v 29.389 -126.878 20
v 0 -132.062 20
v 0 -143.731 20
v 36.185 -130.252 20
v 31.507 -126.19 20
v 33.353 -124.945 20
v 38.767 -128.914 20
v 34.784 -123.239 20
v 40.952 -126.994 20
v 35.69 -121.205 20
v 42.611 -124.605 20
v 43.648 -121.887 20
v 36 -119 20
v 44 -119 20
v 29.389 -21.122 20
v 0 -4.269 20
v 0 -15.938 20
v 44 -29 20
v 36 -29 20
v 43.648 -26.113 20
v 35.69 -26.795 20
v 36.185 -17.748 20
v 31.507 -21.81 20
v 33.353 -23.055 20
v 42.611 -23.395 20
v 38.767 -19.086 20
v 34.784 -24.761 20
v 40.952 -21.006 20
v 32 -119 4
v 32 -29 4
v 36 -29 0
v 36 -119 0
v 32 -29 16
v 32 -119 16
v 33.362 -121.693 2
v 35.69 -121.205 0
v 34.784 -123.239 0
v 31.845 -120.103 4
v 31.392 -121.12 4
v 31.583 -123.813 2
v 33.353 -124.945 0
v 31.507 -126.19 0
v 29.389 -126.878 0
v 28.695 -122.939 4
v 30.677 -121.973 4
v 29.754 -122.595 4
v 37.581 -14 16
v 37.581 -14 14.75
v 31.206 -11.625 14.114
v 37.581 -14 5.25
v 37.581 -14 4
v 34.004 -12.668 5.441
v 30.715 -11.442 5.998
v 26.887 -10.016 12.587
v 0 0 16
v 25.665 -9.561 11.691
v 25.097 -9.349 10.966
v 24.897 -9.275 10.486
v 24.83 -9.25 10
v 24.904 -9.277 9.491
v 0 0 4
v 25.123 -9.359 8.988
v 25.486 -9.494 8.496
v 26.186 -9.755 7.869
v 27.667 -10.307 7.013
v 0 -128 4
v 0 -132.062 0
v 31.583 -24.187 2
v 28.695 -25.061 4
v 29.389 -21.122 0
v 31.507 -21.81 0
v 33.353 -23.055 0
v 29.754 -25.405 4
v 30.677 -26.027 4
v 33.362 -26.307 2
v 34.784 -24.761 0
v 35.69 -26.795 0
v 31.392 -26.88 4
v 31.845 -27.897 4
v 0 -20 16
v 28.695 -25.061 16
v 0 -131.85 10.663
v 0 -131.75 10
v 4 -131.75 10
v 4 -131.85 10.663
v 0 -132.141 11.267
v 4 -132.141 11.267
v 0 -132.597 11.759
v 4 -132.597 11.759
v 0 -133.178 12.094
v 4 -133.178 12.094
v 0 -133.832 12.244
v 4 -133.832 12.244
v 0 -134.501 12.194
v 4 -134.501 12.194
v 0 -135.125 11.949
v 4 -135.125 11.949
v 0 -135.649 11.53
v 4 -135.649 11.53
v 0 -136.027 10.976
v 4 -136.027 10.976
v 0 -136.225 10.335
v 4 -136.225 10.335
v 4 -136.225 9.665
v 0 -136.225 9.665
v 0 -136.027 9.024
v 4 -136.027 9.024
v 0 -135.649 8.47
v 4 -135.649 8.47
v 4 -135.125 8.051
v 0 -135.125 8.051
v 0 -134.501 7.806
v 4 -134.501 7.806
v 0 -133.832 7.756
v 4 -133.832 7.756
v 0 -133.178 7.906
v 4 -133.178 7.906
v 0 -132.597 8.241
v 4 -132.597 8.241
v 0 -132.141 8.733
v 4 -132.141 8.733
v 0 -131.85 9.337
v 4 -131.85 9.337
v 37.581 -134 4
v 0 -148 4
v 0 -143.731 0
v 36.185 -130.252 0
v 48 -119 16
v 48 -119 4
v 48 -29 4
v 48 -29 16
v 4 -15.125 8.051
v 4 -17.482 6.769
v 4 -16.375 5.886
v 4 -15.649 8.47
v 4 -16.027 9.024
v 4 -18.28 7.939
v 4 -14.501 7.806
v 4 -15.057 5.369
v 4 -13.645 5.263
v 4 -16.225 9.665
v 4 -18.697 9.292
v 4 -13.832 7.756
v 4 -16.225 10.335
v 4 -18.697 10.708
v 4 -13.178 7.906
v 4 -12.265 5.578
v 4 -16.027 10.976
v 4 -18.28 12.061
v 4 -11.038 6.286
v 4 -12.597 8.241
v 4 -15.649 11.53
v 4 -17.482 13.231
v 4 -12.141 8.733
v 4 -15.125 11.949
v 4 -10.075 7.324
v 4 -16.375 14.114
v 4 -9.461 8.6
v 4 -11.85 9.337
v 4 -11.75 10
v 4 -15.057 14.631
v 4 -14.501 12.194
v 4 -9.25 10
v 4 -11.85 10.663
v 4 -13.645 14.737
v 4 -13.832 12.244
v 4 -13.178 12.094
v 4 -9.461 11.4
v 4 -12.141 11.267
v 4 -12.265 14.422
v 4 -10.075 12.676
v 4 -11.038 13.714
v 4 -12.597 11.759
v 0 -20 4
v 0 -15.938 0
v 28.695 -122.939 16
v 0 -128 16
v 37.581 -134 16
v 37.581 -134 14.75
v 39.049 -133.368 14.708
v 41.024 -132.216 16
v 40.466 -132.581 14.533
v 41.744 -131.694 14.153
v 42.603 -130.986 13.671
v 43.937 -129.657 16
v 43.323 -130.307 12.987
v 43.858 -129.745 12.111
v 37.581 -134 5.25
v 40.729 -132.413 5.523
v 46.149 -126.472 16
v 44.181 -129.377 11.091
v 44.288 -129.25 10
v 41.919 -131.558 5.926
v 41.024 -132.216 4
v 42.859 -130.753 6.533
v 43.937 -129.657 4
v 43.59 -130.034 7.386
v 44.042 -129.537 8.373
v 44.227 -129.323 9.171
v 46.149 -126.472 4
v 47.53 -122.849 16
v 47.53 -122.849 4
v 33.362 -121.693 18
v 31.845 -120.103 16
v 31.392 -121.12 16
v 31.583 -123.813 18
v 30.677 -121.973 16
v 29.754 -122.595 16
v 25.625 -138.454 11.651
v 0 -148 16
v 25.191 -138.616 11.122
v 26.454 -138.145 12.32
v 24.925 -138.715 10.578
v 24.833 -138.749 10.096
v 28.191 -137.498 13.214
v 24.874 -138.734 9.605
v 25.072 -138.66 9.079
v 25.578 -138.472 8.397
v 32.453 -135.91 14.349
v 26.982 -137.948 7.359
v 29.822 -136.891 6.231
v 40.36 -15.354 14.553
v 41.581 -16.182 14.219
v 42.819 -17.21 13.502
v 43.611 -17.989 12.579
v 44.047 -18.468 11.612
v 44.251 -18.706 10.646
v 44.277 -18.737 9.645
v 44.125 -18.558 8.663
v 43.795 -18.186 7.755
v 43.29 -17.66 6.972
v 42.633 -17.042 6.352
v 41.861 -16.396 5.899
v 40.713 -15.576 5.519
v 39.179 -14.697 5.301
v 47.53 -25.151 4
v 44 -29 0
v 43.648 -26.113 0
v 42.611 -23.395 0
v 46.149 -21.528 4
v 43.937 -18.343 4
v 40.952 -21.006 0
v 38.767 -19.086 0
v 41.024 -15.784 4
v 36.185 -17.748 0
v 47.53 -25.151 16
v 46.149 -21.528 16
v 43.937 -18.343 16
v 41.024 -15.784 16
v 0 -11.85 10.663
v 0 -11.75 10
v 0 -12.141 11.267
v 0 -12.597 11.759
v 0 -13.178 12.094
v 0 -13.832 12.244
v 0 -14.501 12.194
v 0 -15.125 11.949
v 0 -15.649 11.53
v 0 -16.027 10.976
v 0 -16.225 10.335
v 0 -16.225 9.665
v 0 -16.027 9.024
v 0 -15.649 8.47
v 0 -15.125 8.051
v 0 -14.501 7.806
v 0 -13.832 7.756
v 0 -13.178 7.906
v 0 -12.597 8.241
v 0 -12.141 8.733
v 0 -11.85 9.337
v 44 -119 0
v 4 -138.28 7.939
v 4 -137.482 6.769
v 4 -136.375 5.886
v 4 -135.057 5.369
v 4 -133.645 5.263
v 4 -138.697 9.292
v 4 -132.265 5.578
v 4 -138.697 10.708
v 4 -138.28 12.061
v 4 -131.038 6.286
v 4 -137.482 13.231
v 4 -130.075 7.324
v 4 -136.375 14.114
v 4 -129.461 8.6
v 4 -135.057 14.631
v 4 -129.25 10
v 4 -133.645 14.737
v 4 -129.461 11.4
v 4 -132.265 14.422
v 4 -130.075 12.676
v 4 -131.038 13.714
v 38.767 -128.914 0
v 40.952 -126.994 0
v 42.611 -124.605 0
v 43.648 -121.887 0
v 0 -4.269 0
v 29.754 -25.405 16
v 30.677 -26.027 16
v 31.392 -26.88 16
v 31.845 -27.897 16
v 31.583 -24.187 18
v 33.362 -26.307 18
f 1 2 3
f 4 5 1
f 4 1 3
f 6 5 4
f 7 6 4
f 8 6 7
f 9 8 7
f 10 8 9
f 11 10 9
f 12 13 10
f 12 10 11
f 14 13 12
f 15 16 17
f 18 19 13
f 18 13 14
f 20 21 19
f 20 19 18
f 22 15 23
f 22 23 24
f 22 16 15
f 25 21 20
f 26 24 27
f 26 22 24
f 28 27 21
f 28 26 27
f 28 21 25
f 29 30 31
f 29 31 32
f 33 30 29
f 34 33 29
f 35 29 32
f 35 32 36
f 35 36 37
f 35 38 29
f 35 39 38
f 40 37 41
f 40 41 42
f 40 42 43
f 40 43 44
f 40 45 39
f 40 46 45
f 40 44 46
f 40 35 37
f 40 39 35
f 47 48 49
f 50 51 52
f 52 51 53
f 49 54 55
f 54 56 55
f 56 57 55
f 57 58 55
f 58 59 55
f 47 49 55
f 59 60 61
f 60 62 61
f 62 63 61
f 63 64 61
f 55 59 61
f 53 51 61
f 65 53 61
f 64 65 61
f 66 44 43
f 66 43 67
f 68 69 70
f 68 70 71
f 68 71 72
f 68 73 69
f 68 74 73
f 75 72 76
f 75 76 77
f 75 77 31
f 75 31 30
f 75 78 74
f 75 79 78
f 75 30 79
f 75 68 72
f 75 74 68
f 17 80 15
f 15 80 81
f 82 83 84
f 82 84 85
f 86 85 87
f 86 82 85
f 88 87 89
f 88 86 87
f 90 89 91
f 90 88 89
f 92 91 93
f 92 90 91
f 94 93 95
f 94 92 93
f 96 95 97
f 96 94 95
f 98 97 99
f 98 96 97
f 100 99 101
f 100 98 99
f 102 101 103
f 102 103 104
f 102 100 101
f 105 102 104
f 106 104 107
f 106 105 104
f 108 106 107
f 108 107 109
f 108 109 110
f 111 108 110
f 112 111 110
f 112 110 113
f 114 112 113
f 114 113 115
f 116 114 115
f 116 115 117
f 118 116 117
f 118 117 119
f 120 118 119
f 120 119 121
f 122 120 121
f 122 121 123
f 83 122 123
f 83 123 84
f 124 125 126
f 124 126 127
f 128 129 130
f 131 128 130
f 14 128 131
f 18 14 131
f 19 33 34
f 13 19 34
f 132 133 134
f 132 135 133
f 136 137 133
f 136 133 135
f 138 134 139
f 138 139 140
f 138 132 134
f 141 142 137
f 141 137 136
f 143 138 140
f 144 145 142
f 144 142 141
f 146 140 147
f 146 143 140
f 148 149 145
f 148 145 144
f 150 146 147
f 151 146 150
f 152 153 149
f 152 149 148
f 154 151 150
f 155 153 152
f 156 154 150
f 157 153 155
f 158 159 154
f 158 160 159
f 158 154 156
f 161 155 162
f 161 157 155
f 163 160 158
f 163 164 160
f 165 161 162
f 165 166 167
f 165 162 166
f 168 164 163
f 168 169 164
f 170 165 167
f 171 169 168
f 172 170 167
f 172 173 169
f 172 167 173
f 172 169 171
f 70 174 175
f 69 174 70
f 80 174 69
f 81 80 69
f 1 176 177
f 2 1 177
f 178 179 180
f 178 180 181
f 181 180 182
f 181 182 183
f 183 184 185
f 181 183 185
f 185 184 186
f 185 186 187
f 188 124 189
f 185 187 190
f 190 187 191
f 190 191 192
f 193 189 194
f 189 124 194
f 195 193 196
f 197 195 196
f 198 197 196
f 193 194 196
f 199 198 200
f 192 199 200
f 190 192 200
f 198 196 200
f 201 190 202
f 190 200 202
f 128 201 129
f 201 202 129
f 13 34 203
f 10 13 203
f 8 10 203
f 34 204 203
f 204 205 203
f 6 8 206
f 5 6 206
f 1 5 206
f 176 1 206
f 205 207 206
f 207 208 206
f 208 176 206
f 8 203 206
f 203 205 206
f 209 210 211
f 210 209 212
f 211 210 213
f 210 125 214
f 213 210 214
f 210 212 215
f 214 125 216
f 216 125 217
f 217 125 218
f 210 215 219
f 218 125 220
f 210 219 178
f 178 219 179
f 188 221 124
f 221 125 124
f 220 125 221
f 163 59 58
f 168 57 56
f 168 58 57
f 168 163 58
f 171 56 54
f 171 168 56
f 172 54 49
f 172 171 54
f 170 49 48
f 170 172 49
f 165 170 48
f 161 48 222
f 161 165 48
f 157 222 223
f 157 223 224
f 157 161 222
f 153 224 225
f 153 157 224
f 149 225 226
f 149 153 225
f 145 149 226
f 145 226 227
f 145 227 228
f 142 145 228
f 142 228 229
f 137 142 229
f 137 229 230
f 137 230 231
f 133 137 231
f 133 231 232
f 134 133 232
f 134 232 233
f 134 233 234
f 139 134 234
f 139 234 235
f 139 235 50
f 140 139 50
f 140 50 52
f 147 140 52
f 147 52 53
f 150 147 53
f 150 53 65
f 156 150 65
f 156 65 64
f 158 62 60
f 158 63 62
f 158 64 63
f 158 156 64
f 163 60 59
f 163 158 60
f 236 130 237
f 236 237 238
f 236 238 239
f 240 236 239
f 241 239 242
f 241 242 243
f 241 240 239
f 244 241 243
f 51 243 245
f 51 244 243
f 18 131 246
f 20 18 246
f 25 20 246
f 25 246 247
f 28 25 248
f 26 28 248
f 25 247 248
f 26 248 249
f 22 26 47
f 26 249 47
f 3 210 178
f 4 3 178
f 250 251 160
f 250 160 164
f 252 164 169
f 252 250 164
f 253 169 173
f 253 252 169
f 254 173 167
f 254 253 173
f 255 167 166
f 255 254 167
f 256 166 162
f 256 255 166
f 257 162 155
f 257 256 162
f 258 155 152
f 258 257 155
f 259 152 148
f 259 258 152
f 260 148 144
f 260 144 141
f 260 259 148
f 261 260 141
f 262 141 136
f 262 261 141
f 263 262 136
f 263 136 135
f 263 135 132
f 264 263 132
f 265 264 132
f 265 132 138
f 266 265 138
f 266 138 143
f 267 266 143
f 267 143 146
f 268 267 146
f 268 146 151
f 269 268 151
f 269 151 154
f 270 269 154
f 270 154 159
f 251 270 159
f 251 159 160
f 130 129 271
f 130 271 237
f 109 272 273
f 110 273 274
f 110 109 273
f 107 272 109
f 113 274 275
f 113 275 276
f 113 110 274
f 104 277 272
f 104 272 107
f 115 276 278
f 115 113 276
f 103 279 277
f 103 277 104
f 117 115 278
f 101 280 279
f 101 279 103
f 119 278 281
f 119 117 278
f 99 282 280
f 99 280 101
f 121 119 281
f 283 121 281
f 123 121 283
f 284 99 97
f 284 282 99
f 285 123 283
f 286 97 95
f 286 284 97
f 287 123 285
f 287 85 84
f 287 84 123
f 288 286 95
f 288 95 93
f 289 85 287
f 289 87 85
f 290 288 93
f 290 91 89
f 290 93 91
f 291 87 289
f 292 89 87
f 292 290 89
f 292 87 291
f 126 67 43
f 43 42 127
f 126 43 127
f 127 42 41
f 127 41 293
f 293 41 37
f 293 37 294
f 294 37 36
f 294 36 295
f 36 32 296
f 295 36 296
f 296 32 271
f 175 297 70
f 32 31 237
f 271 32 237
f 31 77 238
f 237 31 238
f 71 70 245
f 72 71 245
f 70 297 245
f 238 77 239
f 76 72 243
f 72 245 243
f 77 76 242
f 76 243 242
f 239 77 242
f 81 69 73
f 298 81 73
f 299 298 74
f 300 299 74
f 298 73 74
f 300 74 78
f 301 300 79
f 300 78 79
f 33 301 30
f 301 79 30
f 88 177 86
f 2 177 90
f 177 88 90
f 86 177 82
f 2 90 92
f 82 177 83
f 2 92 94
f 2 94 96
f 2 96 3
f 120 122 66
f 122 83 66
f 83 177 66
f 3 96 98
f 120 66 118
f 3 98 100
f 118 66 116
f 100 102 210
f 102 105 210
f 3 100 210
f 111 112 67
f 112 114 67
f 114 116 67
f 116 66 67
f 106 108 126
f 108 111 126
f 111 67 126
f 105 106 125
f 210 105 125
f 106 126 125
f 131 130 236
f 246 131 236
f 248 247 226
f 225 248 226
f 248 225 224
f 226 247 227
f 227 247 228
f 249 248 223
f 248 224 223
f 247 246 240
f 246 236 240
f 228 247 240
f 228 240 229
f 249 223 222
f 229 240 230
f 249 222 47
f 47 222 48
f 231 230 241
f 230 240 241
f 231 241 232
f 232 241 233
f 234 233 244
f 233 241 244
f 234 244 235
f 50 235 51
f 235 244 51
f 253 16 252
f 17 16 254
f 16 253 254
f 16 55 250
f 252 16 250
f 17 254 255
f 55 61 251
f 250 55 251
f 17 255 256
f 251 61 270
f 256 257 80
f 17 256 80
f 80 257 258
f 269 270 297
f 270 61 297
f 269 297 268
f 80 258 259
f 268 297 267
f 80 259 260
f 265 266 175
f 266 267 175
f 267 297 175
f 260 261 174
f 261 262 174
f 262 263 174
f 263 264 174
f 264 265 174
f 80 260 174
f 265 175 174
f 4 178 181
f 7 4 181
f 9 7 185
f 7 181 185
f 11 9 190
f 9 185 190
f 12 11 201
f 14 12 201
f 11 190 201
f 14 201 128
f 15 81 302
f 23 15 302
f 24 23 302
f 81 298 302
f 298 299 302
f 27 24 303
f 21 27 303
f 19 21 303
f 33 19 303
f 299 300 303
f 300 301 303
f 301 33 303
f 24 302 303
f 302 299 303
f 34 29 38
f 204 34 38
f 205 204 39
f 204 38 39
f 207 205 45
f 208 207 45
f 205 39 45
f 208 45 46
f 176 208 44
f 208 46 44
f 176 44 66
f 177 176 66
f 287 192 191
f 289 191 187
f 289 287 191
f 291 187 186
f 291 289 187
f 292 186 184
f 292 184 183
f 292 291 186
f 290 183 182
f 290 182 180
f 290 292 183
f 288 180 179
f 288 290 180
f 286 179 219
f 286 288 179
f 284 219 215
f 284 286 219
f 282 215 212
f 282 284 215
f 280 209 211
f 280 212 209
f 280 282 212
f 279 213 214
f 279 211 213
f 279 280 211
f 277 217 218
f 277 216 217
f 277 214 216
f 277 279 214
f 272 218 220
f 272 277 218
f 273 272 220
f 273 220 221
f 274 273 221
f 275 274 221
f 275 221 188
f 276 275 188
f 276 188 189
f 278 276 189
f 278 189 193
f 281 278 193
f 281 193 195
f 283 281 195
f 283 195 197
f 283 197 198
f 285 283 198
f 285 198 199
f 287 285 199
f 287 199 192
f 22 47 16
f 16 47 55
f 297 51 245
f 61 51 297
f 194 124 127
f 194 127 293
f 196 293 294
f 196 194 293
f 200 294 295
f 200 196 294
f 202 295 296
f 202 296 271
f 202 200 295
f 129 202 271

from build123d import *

# Parameters (mm, degrees)
F1_DEPTH = 20
F2_R     = 2.25
F3_DEPTH = 41.6719115054
F4_START = 4
F2_R_2   = 4.75
F4_DEPTH = 40.2887874281
F5_SIZE  = 4


with BuildPart() as f1:
    # F0 (on Top) → F1 (new body)
    with BuildSketch(Plane.XY):
        with BuildLine():
            Line((37.580910226, -14), (0, 0))
            Line((0, 0), (0, -20))
            Line((0, -20), (28.6947442364, -25.060795709))
            ThreePointArc((28.6947442364, -25.060795709), (31.0642272228, -26.428908495), (32, -29))
            Line((32, -29), (32, -119))
            ThreePointArc((32, -119), (31.0642272228, -121.571091505), (28.6947442364, -122.939204291))
            Line((28.6947442364, -122.939204291), (0, -128))
            Line((0, -128), (0, -148))
            Line((0, -148), (37.580910226, -134))
            ThreePointArc((37.580910226, -134), (45.1396680554, -128.1317773697), (48, -119))
            Line((48, -119), (48, -29))
            ThreePointArc((48, -29), (45.1396680554, -19.8682226303), (37.580910226, -14))
        make_face()
    extrude(amount=F1_DEPTH)

    # F2 (on Right) → F3 (cut, through all)
    with BuildSketch(Plane.YZ):
        with Locations((-14, 10)):
            Circle(F2_R)
        with Locations((-134, 10)):
            Circle(F2_R)
    extrude(amount=F3_DEPTH, mode=Mode.SUBTRACT)

    # F2 (on Right) → F4 (cut)
    with BuildSketch(Plane.YZ.offset(F4_START)):
        with Locations((-14, 10)):
            Circle(F2_R_2)
        with Locations((-14, 10)):
            Circle(F2_R, mode=Mode.SUBTRACT)
        with Locations((-134, 10)):
            Circle(F2_R_2)
        with Locations((-134, 10)):
            Circle(F2_R, mode=Mode.SUBTRACT)
    extrude(amount=F4_DEPTH, mode=Mode.SUBTRACT)

    # F5
    f5_edges = [f1.edges().sort_by_distance(p)[0] for p in [
        (31.064227, -26.428908, 20),
        (45.139668, -19.868223, 20),
        (31.064227, -26.428908, 0),
        (45.139668, -19.868223, 0),
    ]]
    chamfer(f5_edges, length=F5_SIZE)


solid = f1.part
